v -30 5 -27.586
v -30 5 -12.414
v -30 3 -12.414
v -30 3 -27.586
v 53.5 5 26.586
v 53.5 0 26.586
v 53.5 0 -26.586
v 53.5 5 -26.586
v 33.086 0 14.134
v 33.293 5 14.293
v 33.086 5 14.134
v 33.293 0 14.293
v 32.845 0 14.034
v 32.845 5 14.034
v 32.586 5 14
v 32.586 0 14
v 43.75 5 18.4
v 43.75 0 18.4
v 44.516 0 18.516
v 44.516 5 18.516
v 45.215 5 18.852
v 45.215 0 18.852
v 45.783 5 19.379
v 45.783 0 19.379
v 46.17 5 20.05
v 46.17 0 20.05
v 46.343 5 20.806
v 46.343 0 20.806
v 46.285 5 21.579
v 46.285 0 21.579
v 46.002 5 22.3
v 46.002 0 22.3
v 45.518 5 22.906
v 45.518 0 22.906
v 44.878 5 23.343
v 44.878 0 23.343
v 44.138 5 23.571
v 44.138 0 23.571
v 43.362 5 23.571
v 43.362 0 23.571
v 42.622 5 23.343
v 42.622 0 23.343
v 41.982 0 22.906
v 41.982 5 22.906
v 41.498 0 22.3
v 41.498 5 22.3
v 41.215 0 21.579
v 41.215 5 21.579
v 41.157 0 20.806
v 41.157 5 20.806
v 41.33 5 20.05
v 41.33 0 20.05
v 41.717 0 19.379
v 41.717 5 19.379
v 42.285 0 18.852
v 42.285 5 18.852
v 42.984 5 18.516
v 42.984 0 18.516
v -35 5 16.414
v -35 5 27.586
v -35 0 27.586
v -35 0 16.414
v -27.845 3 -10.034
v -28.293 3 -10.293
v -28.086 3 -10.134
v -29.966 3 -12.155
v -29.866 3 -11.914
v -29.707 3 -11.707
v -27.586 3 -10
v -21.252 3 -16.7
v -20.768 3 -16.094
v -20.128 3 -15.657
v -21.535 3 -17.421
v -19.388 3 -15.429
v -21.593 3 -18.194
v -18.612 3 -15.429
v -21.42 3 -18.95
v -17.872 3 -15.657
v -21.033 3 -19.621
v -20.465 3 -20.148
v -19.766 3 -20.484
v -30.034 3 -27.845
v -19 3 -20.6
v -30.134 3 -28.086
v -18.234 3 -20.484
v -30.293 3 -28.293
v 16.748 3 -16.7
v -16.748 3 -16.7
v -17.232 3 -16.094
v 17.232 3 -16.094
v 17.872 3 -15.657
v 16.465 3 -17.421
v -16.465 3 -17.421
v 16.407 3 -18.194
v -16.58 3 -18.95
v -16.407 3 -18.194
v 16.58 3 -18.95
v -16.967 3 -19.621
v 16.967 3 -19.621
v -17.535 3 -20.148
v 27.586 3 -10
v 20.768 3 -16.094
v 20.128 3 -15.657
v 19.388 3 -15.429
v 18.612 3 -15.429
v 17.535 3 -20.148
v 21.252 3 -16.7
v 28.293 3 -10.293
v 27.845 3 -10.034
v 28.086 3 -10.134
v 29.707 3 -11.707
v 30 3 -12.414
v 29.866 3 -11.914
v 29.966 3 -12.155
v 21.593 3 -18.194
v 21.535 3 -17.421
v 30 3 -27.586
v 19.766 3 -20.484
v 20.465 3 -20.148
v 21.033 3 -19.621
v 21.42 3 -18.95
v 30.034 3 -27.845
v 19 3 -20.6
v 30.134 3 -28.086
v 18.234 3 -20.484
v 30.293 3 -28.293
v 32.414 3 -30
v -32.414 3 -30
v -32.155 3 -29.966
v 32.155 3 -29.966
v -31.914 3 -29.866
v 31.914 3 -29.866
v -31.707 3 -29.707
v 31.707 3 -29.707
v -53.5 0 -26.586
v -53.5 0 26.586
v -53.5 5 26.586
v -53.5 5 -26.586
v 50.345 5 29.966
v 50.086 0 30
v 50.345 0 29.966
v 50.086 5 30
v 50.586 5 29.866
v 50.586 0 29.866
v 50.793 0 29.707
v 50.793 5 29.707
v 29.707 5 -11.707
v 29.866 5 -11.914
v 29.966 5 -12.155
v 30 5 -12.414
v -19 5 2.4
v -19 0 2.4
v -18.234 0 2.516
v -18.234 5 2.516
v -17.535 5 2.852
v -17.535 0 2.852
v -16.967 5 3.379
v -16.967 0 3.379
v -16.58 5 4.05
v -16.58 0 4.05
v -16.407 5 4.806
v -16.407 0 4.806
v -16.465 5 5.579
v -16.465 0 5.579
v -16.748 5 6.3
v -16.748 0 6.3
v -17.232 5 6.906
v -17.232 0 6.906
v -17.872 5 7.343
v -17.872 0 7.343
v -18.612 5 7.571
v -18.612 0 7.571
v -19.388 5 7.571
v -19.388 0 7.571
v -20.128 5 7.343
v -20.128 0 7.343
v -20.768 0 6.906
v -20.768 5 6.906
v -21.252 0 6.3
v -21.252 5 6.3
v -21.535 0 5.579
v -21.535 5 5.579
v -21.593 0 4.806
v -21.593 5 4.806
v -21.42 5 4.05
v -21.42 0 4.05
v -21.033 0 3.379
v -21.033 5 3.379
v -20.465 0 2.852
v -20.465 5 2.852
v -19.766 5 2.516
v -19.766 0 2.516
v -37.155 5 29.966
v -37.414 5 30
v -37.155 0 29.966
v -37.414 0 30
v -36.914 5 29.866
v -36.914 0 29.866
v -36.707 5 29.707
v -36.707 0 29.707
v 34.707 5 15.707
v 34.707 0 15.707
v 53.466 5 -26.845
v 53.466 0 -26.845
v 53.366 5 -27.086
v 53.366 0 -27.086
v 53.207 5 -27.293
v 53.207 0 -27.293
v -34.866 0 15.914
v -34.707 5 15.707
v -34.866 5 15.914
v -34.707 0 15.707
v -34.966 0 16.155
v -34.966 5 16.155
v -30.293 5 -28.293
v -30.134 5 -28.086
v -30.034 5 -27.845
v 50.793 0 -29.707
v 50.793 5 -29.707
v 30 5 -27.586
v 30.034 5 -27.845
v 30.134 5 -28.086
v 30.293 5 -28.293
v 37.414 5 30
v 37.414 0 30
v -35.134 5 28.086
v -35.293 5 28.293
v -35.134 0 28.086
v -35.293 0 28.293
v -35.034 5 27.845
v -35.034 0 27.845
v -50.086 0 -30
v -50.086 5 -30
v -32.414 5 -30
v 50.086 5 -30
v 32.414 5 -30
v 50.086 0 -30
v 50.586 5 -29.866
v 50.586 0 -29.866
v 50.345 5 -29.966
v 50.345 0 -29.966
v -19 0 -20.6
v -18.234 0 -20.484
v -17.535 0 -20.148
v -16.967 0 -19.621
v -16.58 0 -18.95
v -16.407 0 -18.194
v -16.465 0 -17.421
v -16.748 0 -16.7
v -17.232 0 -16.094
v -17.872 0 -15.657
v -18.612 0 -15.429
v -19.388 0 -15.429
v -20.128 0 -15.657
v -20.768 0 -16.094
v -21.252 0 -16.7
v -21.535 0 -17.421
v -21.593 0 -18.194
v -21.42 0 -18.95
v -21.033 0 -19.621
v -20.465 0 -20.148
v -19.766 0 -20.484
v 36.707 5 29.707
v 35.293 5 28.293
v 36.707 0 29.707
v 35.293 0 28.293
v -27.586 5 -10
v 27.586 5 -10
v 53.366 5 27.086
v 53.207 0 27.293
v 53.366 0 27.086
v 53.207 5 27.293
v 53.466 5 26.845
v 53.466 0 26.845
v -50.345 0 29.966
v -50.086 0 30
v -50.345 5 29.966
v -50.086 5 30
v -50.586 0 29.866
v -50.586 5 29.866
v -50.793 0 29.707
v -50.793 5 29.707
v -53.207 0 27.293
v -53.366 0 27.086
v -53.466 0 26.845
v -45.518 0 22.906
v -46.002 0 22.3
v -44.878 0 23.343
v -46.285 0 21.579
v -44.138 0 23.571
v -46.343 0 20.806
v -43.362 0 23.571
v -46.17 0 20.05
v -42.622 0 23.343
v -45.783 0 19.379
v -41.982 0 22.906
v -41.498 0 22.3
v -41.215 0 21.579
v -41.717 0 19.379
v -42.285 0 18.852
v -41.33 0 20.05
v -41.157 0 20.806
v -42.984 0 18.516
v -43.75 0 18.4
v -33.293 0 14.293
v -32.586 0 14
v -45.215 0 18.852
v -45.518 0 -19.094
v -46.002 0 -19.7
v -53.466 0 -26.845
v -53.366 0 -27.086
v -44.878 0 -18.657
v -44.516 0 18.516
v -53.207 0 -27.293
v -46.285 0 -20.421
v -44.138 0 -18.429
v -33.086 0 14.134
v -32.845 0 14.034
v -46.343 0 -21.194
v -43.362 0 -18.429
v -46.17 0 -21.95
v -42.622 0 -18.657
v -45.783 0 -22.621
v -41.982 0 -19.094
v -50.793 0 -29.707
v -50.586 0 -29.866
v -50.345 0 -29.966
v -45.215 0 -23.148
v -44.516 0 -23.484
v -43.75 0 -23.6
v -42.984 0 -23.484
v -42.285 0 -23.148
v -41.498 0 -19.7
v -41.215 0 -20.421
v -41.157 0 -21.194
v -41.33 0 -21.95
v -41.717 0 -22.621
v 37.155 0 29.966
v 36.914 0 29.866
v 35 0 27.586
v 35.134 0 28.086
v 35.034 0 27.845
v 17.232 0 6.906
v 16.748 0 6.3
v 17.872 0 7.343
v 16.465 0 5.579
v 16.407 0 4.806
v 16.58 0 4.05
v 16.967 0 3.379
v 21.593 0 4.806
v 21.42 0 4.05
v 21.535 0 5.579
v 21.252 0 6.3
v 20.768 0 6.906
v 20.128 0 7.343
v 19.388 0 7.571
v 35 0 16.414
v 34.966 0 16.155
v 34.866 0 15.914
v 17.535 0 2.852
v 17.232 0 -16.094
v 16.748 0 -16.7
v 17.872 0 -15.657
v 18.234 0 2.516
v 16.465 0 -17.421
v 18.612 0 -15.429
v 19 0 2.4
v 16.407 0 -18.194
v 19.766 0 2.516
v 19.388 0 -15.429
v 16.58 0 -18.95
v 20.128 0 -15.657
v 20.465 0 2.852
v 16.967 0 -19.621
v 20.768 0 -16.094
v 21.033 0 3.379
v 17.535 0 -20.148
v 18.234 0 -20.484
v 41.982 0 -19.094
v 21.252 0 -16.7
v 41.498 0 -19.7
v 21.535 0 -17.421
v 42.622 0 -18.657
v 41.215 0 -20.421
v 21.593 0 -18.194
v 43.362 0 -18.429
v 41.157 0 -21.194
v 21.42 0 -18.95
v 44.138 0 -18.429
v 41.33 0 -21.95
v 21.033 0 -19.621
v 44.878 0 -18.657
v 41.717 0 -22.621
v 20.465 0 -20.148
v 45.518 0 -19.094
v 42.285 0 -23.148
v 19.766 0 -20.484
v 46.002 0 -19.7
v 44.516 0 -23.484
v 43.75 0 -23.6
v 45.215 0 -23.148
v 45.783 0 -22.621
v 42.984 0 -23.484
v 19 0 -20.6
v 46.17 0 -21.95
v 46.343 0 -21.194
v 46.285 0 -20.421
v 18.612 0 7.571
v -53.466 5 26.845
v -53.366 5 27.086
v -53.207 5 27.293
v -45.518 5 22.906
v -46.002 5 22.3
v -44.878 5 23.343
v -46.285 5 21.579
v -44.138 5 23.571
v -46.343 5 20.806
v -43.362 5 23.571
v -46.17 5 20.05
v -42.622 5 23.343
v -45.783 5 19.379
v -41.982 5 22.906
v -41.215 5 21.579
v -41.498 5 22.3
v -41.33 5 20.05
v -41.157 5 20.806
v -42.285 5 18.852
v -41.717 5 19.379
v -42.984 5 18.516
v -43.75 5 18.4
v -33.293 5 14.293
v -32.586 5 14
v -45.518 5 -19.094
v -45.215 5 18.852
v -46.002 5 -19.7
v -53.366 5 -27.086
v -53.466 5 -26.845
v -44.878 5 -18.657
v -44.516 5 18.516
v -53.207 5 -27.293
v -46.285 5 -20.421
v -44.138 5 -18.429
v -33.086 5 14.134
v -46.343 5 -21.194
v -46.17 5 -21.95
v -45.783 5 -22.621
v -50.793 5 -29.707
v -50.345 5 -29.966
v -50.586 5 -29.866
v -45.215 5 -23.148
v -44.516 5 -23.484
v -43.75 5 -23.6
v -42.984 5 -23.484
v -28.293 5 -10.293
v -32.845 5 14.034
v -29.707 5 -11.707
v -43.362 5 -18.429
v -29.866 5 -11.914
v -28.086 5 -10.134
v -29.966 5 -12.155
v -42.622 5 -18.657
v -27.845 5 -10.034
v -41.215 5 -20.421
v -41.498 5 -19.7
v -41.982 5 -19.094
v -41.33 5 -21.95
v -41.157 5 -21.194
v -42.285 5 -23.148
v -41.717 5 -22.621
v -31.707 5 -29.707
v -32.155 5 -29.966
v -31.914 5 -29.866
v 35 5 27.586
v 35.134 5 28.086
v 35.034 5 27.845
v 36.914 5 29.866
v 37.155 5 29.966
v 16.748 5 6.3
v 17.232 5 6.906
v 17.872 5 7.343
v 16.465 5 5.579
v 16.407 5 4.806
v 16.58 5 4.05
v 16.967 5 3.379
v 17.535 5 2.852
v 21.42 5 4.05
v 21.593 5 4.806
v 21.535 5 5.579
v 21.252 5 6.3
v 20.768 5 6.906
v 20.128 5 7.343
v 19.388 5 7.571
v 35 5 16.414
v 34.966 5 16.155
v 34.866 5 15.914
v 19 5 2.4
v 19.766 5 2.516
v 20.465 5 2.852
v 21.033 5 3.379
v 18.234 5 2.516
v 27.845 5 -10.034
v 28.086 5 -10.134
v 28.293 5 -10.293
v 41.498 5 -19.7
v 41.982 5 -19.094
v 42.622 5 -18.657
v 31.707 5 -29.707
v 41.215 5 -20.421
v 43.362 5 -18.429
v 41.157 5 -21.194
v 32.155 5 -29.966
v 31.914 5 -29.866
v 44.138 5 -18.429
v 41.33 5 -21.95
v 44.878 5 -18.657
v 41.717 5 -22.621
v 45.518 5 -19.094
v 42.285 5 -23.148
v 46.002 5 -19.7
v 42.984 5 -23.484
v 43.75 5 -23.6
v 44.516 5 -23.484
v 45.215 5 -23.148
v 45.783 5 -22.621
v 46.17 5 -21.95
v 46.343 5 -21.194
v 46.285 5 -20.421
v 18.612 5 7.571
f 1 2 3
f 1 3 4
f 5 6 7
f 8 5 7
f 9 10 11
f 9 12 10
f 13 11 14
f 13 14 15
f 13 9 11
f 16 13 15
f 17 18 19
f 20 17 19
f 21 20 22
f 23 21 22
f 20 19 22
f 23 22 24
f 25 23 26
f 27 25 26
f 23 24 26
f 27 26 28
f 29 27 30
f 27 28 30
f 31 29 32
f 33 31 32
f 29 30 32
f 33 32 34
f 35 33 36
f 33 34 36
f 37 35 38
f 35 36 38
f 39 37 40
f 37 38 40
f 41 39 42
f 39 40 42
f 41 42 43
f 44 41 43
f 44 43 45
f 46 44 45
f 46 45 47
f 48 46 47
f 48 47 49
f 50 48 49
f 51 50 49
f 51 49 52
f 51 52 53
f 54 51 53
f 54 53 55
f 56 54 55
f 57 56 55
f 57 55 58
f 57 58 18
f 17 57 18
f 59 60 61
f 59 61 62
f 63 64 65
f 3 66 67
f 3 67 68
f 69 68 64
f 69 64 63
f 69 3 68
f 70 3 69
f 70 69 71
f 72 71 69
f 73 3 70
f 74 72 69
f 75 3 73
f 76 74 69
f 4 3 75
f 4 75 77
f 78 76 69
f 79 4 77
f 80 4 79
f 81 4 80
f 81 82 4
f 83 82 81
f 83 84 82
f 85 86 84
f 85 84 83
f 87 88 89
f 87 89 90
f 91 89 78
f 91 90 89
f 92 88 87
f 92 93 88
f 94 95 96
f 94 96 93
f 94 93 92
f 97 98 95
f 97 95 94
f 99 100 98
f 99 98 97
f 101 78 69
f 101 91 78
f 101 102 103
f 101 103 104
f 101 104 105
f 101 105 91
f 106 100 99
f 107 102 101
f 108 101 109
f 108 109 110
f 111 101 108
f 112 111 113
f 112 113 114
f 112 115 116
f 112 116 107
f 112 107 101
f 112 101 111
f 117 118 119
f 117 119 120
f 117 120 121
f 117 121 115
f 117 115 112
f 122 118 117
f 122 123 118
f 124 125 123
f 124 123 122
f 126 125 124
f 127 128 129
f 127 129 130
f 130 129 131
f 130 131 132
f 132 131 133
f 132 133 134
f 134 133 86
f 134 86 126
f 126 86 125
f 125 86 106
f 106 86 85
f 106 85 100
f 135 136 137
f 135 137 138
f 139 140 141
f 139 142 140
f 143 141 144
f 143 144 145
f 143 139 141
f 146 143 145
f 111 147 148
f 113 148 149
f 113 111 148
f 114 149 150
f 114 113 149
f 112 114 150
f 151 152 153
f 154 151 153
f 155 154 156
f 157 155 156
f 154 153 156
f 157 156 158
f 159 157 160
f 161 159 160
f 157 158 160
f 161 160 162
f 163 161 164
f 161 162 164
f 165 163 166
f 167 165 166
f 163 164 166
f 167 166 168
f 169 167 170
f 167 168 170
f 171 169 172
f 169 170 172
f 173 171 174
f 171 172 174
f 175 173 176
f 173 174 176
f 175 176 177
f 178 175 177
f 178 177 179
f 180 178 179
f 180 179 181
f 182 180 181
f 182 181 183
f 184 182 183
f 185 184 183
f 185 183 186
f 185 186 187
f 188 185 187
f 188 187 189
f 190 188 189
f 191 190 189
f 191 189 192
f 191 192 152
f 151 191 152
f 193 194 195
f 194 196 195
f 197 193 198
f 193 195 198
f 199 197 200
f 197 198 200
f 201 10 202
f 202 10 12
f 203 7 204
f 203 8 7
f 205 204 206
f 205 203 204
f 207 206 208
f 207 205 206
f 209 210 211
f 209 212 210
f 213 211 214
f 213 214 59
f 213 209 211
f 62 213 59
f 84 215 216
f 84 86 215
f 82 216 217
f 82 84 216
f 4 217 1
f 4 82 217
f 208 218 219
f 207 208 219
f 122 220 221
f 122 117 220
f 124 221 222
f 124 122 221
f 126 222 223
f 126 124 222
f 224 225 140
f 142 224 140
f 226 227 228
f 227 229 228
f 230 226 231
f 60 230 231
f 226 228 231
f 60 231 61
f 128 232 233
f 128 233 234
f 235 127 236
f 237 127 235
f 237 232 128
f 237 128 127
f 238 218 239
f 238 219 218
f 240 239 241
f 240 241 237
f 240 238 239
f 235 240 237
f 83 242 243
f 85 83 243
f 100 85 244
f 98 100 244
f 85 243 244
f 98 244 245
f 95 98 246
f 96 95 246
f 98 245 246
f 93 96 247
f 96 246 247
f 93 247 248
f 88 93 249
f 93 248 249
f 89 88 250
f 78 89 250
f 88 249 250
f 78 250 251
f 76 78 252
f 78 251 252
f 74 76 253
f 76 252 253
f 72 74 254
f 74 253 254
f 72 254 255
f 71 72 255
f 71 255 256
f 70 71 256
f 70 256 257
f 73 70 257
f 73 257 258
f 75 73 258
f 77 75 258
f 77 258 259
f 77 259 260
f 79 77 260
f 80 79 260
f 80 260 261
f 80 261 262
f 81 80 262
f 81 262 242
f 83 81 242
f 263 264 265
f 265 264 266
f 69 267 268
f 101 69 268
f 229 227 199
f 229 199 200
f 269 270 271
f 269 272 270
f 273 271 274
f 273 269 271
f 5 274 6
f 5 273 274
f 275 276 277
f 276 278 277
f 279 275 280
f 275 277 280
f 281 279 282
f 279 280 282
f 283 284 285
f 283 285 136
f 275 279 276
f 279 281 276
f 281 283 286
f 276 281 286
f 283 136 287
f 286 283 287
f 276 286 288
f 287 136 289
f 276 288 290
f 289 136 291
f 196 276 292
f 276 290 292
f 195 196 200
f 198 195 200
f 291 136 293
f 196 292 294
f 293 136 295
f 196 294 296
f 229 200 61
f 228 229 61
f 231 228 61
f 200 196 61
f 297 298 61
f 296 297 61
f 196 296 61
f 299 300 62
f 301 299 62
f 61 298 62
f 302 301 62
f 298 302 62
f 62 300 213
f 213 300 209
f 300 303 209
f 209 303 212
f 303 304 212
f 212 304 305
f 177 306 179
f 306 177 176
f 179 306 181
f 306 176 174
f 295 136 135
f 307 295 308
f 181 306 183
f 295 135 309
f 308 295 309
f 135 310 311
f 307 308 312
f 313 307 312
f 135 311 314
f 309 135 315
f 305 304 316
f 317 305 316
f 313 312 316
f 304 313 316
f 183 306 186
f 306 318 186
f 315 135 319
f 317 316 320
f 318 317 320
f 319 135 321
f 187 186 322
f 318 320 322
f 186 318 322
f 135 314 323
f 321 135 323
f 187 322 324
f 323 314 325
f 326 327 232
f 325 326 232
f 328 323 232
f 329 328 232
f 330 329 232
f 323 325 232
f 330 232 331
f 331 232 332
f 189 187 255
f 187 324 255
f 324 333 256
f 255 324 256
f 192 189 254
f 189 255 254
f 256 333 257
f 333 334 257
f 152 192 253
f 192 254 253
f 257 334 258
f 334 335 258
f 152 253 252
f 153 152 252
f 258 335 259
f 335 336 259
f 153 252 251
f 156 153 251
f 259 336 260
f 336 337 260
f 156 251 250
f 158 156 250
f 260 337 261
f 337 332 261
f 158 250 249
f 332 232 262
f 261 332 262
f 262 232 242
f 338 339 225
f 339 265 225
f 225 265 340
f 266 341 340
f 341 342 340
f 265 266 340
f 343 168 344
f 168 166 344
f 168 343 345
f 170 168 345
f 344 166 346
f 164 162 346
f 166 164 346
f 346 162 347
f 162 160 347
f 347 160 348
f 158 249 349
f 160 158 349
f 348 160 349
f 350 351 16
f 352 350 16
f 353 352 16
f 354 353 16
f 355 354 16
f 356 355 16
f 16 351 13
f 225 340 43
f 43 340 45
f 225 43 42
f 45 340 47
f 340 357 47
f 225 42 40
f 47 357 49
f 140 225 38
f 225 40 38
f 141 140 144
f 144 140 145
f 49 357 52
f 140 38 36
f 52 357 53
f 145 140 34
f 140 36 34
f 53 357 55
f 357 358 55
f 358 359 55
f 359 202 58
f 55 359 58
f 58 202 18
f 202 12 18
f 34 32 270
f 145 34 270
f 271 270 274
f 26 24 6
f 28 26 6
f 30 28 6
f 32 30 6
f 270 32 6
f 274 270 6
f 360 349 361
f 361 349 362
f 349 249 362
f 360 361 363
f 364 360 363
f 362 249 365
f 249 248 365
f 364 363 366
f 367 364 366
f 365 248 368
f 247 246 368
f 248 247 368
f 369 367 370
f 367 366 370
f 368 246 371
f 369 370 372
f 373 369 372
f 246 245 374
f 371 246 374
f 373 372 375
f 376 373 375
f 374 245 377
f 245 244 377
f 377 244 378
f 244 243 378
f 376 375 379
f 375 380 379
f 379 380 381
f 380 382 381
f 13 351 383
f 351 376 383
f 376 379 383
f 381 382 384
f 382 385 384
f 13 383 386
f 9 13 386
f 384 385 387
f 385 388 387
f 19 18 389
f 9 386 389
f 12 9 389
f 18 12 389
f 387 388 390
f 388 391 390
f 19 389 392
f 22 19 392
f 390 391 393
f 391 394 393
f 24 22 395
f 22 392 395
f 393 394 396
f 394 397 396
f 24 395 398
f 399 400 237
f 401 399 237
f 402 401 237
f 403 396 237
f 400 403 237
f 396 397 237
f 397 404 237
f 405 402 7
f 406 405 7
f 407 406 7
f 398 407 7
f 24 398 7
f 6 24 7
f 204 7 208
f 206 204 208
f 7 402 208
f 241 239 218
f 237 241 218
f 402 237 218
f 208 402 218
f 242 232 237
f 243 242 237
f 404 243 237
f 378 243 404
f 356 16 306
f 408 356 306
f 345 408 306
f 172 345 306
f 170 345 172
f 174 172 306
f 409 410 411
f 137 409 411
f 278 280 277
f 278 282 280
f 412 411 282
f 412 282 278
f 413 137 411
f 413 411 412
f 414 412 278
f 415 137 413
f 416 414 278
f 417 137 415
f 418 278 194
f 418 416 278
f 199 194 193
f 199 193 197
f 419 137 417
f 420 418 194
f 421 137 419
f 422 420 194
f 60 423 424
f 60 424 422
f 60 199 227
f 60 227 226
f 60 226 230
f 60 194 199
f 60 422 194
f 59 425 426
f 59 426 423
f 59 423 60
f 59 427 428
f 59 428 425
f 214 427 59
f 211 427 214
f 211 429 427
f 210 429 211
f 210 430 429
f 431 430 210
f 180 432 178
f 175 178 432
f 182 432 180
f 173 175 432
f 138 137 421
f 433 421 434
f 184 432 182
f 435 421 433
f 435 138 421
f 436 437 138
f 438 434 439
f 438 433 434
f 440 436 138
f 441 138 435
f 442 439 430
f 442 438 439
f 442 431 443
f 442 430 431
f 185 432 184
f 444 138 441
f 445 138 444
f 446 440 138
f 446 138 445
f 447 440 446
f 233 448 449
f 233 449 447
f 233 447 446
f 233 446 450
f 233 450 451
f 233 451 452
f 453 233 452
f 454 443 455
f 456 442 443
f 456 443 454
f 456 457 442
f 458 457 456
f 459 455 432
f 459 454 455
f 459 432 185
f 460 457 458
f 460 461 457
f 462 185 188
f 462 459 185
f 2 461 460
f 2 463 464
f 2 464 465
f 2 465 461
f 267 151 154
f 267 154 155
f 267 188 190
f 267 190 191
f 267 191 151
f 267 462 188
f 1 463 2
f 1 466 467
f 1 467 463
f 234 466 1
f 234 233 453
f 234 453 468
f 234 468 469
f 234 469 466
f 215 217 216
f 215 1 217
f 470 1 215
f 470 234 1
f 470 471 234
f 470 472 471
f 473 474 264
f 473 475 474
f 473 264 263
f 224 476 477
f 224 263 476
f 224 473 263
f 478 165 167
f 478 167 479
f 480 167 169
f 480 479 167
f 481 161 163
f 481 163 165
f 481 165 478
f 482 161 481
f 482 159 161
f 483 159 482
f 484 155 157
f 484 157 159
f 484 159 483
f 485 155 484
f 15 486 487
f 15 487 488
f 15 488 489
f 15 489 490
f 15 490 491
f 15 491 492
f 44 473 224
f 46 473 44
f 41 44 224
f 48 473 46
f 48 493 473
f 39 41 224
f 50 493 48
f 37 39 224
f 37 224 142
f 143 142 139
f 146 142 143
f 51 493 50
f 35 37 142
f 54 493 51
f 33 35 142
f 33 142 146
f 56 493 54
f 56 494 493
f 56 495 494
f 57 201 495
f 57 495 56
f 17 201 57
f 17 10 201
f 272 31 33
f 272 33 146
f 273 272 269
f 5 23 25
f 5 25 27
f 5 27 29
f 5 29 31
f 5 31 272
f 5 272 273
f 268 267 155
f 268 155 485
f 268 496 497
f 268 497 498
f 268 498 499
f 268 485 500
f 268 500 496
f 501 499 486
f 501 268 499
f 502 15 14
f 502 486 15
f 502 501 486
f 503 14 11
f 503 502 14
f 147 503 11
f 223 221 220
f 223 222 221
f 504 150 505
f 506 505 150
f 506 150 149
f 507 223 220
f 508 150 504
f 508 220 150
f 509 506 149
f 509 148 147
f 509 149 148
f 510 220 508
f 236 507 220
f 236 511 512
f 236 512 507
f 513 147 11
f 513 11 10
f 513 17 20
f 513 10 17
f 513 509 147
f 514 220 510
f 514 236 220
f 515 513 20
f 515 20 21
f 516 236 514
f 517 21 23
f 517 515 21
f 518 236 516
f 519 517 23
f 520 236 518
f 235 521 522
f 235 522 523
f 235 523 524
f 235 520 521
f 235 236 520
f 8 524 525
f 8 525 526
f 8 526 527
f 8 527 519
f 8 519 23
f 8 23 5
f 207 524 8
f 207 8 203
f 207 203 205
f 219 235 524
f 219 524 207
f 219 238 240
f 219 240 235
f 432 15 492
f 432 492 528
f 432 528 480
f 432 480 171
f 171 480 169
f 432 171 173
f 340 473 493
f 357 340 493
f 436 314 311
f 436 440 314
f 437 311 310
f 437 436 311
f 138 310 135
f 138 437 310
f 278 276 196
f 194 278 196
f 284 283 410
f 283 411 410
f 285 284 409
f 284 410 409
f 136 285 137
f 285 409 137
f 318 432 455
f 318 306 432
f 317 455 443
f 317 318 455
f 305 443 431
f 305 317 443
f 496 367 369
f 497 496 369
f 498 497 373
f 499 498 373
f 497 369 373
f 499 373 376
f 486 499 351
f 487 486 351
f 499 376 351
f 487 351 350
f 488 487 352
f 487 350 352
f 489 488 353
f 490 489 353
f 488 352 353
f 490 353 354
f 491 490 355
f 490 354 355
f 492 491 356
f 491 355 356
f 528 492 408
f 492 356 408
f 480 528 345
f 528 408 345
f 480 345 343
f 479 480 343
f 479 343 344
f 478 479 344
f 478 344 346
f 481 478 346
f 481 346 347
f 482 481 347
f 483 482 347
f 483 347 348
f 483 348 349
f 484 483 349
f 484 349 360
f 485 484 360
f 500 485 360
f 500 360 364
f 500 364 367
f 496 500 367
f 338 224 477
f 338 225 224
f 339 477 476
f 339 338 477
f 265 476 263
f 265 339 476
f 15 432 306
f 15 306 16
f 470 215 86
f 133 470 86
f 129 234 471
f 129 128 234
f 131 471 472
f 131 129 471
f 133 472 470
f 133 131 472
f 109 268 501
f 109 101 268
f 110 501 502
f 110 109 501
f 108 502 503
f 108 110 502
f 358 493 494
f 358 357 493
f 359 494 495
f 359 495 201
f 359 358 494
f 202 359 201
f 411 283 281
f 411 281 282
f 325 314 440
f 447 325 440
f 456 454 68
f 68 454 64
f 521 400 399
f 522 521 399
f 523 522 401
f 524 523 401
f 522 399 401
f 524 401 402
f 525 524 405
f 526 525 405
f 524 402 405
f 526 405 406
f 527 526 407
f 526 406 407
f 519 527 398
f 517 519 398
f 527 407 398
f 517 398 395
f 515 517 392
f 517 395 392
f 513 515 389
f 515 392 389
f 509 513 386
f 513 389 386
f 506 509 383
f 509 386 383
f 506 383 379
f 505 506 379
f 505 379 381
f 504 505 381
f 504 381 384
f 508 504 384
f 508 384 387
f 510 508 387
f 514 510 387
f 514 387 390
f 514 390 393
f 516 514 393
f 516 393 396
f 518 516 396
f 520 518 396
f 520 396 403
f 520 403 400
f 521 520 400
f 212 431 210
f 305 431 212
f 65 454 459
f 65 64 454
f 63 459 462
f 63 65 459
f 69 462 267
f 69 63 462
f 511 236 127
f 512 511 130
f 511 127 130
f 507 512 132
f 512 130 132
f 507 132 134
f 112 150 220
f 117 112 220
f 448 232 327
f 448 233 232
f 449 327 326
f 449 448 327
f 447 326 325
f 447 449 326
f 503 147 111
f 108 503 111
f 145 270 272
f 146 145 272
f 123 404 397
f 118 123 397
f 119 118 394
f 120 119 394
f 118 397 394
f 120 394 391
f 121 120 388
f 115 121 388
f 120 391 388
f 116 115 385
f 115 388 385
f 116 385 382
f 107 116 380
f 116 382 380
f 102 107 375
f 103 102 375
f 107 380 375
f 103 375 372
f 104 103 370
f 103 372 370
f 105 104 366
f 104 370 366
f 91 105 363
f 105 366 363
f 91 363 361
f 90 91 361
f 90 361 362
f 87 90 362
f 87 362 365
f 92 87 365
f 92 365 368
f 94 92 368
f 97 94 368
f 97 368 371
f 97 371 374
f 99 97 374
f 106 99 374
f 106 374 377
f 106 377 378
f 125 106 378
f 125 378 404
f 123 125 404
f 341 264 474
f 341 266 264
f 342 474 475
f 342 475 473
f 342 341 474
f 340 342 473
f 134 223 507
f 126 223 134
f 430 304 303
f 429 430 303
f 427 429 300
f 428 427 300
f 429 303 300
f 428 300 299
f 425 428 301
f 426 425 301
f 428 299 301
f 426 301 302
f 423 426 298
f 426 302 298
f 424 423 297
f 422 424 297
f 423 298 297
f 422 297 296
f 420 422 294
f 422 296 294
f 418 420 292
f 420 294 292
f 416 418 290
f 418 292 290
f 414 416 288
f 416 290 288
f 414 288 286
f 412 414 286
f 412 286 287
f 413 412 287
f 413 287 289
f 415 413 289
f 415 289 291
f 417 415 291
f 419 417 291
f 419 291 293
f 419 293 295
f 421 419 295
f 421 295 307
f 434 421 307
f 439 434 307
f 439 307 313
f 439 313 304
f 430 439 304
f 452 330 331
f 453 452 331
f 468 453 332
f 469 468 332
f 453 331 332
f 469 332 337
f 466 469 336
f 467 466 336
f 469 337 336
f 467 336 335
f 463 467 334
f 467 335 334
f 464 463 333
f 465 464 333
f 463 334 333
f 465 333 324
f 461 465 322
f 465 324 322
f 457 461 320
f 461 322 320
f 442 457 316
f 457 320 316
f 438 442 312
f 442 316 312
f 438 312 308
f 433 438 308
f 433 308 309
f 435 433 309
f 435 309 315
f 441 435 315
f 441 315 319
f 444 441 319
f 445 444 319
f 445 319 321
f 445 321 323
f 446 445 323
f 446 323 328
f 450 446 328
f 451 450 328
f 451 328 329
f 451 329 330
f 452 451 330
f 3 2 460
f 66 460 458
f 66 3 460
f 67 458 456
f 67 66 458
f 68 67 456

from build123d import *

# Parameters (mm, degrees)
SKETCH1_W                   = 107
SKETCH1_H                   = 60
BOSS_EXTRUDE1_DEPTH         = 5
SKETCH2_W                   = 60
SKETCH2_H                   = 20
CUT_EXTRUDE1_DEPTH          = 2
CUT_EXTRUDE2_REACH          = 7
SKETCH3_W                   = 70
SKETCH3_H                   = 16
CHAMFER1_SIZE               = 2
CHAMFER2_SIZE               = 3
FILLET1_R                   = 1
TAP_DRILL_FOR_M5_TAP1_D     = 5.2
TAP_DRILL_FOR_M5_TAP1_DEPTH = 46
TAP_DRILL_FOR_M5_TAP1_TIP   = 1.562237609
TAP_DRILL_FOR_M5_TAP2_D     = 5.2
TAP_DRILL_FOR_M5_TAP2_DEPTH = 46
TAP_DRILL_FOR_M5_TAP2_TIP   = 1.562237609


with BuildPart() as part:
    # Sketch1 → Boss-Extrude1 (new body)
    with BuildSketch(Plane(origin=(0, 0, 0), x_dir=(1, 0, 0), z_dir=(0, 1, 0))):
        Rectangle(SKETCH1_W, SKETCH1_H)
    extrude(amount=BOSS_EXTRUDE1_DEPTH)

    # Sketch2 → Cut-Extrude1 (cut)
    with BuildSketch(Plane(origin=(0, 5, 0), x_dir=(1, 0, 0), z_dir=(0, 1, 0))):
        with Locations((0, 20)):
            Rectangle(SKETCH2_W, SKETCH2_H)
    extrude(amount=-CUT_EXTRUDE1_DEPTH, mode=Mode.SUBTRACT)

    # Sketch3 → Cut-Extrude2 (cut, up to next)
    with BuildSketch(Plane(origin=(0, 5, 0), x_dir=(1, 0, 0), z_dir=(0, 1, 0)), mode=Mode.PRIVATE) as cut_extrude2_sk1:
        with Locations((0, -22)):
            Rectangle(SKETCH3_W, SKETCH3_H)
    cut_extrude2_tool1 = extrude(cut_extrude2_sk1.sketch, amount=-CUT_EXTRUDE2_REACH, mode=Mode.PRIVATE) & part.part
    add(cut_extrude2_tool1.solids().sort_by_distance((0, 5, 22))[0], mode=Mode.SUBTRACT)

    # Chamfer1
    chamfer1_edges = [part.edges().sort_by_distance(p)[0] for p in [
        (-30, 4, -10),
        (-30, 4, -30),
        (30, 4, -30),
        (30, 4, -10),
        (35, 2.5, 14),
        (35, 2.5, 30),
        (-35, 2.5, 30),
        (-35, 2.5, 14),
    ]]
    chamfer(chamfer1_edges, length=CHAMFER1_SIZE)

    # Chamfer2
    chamfer2_edges = [part.edges().sort_by_distance(p)[0] for p in [
        (53.5, 2.5, 30),
        (-53.5, 2.5, 30),
        (-53.5, 2.5, -30),
        (53.5, 2.5, -30),
    ]]
    chamfer(chamfer2_edges, length=CHAMFER2_SIZE)

    # Fillet1
    fillet1_edges = [part.edges().sort_by_distance(p)[0] for p in [
        (53.5, 2.5, -27),
        (53.5, 2.5, 27),
        (50.5, 2.5, 30),
        (-50.5, 2.5, -30),
        (50.5, 2.5, -30),
        (-53.5, 2.5, 27),
        (-53.5, 2.5, -27),
        (-50.5, 2.5, 30),
        (-32, 4, -30),
        (32, 4, -30),
        (30, 4, -12),
        (30, 4, -28),
        (-28, 4, -10),
        (28, 4, -10),
        (-30, 4, -28),
        (-30, 4, -12),
        (35, 2.5, 16),
        (35, 2.5, 28),
        (37, 2.5, 30),
        (-33, 2.5, 14),
        (33, 2.5, 14),
        (-35, 2.5, 28),
        (-35, 2.5, 16),
        (-37, 2.5, 30),
    ]]
    fillet(fillet1_edges, radius=FILLET1_R)

    # Tap Drill for M5 Tap1
    with Locations(Plane(origin=(-43.75, 5, -21), x_dir=(0, 0, 1), z_dir=(0, 1, 0))):
        with Locations((0, 0), (42, 0), (26, 24.75), (26, 62.75), (0, 87.5), (42, 87.5)):
            Hole(TAP_DRILL_FOR_M5_TAP1_D / 2, depth=TAP_DRILL_FOR_M5_TAP1_DEPTH)
            with Locations((0, 0, -(TAP_DRILL_FOR_M5_TAP1_DEPTH + TAP_DRILL_FOR_M5_TAP1_TIP / 2))):  # 118° drill point
                Cone(0, TAP_DRILL_FOR_M5_TAP1_D / 2, TAP_DRILL_FOR_M5_TAP1_TIP, mode=Mode.SUBTRACT)

    # Tap Drill for M5 Tap2
    with Locations(Plane(origin=(-19, 3, -18), x_dir=(0, 0, 1), z_dir=(0, 1, 0))):
        with Locations((0, 0), (0, 38)):
            Hole(TAP_DRILL_FOR_M5_TAP2_D / 2, depth=TAP_DRILL_FOR_M5_TAP2_DEPTH)
            with Locations((0, 0, -(TAP_DRILL_FOR_M5_TAP2_DEPTH + TAP_DRILL_FOR_M5_TAP2_TIP / 2))):  # 118° drill point
                Cone(0, TAP_DRILL_FOR_M5_TAP2_D / 2, TAP_DRILL_FOR_M5_TAP2_TIP, mode=Mode.SUBTRACT)


solid = part.part
